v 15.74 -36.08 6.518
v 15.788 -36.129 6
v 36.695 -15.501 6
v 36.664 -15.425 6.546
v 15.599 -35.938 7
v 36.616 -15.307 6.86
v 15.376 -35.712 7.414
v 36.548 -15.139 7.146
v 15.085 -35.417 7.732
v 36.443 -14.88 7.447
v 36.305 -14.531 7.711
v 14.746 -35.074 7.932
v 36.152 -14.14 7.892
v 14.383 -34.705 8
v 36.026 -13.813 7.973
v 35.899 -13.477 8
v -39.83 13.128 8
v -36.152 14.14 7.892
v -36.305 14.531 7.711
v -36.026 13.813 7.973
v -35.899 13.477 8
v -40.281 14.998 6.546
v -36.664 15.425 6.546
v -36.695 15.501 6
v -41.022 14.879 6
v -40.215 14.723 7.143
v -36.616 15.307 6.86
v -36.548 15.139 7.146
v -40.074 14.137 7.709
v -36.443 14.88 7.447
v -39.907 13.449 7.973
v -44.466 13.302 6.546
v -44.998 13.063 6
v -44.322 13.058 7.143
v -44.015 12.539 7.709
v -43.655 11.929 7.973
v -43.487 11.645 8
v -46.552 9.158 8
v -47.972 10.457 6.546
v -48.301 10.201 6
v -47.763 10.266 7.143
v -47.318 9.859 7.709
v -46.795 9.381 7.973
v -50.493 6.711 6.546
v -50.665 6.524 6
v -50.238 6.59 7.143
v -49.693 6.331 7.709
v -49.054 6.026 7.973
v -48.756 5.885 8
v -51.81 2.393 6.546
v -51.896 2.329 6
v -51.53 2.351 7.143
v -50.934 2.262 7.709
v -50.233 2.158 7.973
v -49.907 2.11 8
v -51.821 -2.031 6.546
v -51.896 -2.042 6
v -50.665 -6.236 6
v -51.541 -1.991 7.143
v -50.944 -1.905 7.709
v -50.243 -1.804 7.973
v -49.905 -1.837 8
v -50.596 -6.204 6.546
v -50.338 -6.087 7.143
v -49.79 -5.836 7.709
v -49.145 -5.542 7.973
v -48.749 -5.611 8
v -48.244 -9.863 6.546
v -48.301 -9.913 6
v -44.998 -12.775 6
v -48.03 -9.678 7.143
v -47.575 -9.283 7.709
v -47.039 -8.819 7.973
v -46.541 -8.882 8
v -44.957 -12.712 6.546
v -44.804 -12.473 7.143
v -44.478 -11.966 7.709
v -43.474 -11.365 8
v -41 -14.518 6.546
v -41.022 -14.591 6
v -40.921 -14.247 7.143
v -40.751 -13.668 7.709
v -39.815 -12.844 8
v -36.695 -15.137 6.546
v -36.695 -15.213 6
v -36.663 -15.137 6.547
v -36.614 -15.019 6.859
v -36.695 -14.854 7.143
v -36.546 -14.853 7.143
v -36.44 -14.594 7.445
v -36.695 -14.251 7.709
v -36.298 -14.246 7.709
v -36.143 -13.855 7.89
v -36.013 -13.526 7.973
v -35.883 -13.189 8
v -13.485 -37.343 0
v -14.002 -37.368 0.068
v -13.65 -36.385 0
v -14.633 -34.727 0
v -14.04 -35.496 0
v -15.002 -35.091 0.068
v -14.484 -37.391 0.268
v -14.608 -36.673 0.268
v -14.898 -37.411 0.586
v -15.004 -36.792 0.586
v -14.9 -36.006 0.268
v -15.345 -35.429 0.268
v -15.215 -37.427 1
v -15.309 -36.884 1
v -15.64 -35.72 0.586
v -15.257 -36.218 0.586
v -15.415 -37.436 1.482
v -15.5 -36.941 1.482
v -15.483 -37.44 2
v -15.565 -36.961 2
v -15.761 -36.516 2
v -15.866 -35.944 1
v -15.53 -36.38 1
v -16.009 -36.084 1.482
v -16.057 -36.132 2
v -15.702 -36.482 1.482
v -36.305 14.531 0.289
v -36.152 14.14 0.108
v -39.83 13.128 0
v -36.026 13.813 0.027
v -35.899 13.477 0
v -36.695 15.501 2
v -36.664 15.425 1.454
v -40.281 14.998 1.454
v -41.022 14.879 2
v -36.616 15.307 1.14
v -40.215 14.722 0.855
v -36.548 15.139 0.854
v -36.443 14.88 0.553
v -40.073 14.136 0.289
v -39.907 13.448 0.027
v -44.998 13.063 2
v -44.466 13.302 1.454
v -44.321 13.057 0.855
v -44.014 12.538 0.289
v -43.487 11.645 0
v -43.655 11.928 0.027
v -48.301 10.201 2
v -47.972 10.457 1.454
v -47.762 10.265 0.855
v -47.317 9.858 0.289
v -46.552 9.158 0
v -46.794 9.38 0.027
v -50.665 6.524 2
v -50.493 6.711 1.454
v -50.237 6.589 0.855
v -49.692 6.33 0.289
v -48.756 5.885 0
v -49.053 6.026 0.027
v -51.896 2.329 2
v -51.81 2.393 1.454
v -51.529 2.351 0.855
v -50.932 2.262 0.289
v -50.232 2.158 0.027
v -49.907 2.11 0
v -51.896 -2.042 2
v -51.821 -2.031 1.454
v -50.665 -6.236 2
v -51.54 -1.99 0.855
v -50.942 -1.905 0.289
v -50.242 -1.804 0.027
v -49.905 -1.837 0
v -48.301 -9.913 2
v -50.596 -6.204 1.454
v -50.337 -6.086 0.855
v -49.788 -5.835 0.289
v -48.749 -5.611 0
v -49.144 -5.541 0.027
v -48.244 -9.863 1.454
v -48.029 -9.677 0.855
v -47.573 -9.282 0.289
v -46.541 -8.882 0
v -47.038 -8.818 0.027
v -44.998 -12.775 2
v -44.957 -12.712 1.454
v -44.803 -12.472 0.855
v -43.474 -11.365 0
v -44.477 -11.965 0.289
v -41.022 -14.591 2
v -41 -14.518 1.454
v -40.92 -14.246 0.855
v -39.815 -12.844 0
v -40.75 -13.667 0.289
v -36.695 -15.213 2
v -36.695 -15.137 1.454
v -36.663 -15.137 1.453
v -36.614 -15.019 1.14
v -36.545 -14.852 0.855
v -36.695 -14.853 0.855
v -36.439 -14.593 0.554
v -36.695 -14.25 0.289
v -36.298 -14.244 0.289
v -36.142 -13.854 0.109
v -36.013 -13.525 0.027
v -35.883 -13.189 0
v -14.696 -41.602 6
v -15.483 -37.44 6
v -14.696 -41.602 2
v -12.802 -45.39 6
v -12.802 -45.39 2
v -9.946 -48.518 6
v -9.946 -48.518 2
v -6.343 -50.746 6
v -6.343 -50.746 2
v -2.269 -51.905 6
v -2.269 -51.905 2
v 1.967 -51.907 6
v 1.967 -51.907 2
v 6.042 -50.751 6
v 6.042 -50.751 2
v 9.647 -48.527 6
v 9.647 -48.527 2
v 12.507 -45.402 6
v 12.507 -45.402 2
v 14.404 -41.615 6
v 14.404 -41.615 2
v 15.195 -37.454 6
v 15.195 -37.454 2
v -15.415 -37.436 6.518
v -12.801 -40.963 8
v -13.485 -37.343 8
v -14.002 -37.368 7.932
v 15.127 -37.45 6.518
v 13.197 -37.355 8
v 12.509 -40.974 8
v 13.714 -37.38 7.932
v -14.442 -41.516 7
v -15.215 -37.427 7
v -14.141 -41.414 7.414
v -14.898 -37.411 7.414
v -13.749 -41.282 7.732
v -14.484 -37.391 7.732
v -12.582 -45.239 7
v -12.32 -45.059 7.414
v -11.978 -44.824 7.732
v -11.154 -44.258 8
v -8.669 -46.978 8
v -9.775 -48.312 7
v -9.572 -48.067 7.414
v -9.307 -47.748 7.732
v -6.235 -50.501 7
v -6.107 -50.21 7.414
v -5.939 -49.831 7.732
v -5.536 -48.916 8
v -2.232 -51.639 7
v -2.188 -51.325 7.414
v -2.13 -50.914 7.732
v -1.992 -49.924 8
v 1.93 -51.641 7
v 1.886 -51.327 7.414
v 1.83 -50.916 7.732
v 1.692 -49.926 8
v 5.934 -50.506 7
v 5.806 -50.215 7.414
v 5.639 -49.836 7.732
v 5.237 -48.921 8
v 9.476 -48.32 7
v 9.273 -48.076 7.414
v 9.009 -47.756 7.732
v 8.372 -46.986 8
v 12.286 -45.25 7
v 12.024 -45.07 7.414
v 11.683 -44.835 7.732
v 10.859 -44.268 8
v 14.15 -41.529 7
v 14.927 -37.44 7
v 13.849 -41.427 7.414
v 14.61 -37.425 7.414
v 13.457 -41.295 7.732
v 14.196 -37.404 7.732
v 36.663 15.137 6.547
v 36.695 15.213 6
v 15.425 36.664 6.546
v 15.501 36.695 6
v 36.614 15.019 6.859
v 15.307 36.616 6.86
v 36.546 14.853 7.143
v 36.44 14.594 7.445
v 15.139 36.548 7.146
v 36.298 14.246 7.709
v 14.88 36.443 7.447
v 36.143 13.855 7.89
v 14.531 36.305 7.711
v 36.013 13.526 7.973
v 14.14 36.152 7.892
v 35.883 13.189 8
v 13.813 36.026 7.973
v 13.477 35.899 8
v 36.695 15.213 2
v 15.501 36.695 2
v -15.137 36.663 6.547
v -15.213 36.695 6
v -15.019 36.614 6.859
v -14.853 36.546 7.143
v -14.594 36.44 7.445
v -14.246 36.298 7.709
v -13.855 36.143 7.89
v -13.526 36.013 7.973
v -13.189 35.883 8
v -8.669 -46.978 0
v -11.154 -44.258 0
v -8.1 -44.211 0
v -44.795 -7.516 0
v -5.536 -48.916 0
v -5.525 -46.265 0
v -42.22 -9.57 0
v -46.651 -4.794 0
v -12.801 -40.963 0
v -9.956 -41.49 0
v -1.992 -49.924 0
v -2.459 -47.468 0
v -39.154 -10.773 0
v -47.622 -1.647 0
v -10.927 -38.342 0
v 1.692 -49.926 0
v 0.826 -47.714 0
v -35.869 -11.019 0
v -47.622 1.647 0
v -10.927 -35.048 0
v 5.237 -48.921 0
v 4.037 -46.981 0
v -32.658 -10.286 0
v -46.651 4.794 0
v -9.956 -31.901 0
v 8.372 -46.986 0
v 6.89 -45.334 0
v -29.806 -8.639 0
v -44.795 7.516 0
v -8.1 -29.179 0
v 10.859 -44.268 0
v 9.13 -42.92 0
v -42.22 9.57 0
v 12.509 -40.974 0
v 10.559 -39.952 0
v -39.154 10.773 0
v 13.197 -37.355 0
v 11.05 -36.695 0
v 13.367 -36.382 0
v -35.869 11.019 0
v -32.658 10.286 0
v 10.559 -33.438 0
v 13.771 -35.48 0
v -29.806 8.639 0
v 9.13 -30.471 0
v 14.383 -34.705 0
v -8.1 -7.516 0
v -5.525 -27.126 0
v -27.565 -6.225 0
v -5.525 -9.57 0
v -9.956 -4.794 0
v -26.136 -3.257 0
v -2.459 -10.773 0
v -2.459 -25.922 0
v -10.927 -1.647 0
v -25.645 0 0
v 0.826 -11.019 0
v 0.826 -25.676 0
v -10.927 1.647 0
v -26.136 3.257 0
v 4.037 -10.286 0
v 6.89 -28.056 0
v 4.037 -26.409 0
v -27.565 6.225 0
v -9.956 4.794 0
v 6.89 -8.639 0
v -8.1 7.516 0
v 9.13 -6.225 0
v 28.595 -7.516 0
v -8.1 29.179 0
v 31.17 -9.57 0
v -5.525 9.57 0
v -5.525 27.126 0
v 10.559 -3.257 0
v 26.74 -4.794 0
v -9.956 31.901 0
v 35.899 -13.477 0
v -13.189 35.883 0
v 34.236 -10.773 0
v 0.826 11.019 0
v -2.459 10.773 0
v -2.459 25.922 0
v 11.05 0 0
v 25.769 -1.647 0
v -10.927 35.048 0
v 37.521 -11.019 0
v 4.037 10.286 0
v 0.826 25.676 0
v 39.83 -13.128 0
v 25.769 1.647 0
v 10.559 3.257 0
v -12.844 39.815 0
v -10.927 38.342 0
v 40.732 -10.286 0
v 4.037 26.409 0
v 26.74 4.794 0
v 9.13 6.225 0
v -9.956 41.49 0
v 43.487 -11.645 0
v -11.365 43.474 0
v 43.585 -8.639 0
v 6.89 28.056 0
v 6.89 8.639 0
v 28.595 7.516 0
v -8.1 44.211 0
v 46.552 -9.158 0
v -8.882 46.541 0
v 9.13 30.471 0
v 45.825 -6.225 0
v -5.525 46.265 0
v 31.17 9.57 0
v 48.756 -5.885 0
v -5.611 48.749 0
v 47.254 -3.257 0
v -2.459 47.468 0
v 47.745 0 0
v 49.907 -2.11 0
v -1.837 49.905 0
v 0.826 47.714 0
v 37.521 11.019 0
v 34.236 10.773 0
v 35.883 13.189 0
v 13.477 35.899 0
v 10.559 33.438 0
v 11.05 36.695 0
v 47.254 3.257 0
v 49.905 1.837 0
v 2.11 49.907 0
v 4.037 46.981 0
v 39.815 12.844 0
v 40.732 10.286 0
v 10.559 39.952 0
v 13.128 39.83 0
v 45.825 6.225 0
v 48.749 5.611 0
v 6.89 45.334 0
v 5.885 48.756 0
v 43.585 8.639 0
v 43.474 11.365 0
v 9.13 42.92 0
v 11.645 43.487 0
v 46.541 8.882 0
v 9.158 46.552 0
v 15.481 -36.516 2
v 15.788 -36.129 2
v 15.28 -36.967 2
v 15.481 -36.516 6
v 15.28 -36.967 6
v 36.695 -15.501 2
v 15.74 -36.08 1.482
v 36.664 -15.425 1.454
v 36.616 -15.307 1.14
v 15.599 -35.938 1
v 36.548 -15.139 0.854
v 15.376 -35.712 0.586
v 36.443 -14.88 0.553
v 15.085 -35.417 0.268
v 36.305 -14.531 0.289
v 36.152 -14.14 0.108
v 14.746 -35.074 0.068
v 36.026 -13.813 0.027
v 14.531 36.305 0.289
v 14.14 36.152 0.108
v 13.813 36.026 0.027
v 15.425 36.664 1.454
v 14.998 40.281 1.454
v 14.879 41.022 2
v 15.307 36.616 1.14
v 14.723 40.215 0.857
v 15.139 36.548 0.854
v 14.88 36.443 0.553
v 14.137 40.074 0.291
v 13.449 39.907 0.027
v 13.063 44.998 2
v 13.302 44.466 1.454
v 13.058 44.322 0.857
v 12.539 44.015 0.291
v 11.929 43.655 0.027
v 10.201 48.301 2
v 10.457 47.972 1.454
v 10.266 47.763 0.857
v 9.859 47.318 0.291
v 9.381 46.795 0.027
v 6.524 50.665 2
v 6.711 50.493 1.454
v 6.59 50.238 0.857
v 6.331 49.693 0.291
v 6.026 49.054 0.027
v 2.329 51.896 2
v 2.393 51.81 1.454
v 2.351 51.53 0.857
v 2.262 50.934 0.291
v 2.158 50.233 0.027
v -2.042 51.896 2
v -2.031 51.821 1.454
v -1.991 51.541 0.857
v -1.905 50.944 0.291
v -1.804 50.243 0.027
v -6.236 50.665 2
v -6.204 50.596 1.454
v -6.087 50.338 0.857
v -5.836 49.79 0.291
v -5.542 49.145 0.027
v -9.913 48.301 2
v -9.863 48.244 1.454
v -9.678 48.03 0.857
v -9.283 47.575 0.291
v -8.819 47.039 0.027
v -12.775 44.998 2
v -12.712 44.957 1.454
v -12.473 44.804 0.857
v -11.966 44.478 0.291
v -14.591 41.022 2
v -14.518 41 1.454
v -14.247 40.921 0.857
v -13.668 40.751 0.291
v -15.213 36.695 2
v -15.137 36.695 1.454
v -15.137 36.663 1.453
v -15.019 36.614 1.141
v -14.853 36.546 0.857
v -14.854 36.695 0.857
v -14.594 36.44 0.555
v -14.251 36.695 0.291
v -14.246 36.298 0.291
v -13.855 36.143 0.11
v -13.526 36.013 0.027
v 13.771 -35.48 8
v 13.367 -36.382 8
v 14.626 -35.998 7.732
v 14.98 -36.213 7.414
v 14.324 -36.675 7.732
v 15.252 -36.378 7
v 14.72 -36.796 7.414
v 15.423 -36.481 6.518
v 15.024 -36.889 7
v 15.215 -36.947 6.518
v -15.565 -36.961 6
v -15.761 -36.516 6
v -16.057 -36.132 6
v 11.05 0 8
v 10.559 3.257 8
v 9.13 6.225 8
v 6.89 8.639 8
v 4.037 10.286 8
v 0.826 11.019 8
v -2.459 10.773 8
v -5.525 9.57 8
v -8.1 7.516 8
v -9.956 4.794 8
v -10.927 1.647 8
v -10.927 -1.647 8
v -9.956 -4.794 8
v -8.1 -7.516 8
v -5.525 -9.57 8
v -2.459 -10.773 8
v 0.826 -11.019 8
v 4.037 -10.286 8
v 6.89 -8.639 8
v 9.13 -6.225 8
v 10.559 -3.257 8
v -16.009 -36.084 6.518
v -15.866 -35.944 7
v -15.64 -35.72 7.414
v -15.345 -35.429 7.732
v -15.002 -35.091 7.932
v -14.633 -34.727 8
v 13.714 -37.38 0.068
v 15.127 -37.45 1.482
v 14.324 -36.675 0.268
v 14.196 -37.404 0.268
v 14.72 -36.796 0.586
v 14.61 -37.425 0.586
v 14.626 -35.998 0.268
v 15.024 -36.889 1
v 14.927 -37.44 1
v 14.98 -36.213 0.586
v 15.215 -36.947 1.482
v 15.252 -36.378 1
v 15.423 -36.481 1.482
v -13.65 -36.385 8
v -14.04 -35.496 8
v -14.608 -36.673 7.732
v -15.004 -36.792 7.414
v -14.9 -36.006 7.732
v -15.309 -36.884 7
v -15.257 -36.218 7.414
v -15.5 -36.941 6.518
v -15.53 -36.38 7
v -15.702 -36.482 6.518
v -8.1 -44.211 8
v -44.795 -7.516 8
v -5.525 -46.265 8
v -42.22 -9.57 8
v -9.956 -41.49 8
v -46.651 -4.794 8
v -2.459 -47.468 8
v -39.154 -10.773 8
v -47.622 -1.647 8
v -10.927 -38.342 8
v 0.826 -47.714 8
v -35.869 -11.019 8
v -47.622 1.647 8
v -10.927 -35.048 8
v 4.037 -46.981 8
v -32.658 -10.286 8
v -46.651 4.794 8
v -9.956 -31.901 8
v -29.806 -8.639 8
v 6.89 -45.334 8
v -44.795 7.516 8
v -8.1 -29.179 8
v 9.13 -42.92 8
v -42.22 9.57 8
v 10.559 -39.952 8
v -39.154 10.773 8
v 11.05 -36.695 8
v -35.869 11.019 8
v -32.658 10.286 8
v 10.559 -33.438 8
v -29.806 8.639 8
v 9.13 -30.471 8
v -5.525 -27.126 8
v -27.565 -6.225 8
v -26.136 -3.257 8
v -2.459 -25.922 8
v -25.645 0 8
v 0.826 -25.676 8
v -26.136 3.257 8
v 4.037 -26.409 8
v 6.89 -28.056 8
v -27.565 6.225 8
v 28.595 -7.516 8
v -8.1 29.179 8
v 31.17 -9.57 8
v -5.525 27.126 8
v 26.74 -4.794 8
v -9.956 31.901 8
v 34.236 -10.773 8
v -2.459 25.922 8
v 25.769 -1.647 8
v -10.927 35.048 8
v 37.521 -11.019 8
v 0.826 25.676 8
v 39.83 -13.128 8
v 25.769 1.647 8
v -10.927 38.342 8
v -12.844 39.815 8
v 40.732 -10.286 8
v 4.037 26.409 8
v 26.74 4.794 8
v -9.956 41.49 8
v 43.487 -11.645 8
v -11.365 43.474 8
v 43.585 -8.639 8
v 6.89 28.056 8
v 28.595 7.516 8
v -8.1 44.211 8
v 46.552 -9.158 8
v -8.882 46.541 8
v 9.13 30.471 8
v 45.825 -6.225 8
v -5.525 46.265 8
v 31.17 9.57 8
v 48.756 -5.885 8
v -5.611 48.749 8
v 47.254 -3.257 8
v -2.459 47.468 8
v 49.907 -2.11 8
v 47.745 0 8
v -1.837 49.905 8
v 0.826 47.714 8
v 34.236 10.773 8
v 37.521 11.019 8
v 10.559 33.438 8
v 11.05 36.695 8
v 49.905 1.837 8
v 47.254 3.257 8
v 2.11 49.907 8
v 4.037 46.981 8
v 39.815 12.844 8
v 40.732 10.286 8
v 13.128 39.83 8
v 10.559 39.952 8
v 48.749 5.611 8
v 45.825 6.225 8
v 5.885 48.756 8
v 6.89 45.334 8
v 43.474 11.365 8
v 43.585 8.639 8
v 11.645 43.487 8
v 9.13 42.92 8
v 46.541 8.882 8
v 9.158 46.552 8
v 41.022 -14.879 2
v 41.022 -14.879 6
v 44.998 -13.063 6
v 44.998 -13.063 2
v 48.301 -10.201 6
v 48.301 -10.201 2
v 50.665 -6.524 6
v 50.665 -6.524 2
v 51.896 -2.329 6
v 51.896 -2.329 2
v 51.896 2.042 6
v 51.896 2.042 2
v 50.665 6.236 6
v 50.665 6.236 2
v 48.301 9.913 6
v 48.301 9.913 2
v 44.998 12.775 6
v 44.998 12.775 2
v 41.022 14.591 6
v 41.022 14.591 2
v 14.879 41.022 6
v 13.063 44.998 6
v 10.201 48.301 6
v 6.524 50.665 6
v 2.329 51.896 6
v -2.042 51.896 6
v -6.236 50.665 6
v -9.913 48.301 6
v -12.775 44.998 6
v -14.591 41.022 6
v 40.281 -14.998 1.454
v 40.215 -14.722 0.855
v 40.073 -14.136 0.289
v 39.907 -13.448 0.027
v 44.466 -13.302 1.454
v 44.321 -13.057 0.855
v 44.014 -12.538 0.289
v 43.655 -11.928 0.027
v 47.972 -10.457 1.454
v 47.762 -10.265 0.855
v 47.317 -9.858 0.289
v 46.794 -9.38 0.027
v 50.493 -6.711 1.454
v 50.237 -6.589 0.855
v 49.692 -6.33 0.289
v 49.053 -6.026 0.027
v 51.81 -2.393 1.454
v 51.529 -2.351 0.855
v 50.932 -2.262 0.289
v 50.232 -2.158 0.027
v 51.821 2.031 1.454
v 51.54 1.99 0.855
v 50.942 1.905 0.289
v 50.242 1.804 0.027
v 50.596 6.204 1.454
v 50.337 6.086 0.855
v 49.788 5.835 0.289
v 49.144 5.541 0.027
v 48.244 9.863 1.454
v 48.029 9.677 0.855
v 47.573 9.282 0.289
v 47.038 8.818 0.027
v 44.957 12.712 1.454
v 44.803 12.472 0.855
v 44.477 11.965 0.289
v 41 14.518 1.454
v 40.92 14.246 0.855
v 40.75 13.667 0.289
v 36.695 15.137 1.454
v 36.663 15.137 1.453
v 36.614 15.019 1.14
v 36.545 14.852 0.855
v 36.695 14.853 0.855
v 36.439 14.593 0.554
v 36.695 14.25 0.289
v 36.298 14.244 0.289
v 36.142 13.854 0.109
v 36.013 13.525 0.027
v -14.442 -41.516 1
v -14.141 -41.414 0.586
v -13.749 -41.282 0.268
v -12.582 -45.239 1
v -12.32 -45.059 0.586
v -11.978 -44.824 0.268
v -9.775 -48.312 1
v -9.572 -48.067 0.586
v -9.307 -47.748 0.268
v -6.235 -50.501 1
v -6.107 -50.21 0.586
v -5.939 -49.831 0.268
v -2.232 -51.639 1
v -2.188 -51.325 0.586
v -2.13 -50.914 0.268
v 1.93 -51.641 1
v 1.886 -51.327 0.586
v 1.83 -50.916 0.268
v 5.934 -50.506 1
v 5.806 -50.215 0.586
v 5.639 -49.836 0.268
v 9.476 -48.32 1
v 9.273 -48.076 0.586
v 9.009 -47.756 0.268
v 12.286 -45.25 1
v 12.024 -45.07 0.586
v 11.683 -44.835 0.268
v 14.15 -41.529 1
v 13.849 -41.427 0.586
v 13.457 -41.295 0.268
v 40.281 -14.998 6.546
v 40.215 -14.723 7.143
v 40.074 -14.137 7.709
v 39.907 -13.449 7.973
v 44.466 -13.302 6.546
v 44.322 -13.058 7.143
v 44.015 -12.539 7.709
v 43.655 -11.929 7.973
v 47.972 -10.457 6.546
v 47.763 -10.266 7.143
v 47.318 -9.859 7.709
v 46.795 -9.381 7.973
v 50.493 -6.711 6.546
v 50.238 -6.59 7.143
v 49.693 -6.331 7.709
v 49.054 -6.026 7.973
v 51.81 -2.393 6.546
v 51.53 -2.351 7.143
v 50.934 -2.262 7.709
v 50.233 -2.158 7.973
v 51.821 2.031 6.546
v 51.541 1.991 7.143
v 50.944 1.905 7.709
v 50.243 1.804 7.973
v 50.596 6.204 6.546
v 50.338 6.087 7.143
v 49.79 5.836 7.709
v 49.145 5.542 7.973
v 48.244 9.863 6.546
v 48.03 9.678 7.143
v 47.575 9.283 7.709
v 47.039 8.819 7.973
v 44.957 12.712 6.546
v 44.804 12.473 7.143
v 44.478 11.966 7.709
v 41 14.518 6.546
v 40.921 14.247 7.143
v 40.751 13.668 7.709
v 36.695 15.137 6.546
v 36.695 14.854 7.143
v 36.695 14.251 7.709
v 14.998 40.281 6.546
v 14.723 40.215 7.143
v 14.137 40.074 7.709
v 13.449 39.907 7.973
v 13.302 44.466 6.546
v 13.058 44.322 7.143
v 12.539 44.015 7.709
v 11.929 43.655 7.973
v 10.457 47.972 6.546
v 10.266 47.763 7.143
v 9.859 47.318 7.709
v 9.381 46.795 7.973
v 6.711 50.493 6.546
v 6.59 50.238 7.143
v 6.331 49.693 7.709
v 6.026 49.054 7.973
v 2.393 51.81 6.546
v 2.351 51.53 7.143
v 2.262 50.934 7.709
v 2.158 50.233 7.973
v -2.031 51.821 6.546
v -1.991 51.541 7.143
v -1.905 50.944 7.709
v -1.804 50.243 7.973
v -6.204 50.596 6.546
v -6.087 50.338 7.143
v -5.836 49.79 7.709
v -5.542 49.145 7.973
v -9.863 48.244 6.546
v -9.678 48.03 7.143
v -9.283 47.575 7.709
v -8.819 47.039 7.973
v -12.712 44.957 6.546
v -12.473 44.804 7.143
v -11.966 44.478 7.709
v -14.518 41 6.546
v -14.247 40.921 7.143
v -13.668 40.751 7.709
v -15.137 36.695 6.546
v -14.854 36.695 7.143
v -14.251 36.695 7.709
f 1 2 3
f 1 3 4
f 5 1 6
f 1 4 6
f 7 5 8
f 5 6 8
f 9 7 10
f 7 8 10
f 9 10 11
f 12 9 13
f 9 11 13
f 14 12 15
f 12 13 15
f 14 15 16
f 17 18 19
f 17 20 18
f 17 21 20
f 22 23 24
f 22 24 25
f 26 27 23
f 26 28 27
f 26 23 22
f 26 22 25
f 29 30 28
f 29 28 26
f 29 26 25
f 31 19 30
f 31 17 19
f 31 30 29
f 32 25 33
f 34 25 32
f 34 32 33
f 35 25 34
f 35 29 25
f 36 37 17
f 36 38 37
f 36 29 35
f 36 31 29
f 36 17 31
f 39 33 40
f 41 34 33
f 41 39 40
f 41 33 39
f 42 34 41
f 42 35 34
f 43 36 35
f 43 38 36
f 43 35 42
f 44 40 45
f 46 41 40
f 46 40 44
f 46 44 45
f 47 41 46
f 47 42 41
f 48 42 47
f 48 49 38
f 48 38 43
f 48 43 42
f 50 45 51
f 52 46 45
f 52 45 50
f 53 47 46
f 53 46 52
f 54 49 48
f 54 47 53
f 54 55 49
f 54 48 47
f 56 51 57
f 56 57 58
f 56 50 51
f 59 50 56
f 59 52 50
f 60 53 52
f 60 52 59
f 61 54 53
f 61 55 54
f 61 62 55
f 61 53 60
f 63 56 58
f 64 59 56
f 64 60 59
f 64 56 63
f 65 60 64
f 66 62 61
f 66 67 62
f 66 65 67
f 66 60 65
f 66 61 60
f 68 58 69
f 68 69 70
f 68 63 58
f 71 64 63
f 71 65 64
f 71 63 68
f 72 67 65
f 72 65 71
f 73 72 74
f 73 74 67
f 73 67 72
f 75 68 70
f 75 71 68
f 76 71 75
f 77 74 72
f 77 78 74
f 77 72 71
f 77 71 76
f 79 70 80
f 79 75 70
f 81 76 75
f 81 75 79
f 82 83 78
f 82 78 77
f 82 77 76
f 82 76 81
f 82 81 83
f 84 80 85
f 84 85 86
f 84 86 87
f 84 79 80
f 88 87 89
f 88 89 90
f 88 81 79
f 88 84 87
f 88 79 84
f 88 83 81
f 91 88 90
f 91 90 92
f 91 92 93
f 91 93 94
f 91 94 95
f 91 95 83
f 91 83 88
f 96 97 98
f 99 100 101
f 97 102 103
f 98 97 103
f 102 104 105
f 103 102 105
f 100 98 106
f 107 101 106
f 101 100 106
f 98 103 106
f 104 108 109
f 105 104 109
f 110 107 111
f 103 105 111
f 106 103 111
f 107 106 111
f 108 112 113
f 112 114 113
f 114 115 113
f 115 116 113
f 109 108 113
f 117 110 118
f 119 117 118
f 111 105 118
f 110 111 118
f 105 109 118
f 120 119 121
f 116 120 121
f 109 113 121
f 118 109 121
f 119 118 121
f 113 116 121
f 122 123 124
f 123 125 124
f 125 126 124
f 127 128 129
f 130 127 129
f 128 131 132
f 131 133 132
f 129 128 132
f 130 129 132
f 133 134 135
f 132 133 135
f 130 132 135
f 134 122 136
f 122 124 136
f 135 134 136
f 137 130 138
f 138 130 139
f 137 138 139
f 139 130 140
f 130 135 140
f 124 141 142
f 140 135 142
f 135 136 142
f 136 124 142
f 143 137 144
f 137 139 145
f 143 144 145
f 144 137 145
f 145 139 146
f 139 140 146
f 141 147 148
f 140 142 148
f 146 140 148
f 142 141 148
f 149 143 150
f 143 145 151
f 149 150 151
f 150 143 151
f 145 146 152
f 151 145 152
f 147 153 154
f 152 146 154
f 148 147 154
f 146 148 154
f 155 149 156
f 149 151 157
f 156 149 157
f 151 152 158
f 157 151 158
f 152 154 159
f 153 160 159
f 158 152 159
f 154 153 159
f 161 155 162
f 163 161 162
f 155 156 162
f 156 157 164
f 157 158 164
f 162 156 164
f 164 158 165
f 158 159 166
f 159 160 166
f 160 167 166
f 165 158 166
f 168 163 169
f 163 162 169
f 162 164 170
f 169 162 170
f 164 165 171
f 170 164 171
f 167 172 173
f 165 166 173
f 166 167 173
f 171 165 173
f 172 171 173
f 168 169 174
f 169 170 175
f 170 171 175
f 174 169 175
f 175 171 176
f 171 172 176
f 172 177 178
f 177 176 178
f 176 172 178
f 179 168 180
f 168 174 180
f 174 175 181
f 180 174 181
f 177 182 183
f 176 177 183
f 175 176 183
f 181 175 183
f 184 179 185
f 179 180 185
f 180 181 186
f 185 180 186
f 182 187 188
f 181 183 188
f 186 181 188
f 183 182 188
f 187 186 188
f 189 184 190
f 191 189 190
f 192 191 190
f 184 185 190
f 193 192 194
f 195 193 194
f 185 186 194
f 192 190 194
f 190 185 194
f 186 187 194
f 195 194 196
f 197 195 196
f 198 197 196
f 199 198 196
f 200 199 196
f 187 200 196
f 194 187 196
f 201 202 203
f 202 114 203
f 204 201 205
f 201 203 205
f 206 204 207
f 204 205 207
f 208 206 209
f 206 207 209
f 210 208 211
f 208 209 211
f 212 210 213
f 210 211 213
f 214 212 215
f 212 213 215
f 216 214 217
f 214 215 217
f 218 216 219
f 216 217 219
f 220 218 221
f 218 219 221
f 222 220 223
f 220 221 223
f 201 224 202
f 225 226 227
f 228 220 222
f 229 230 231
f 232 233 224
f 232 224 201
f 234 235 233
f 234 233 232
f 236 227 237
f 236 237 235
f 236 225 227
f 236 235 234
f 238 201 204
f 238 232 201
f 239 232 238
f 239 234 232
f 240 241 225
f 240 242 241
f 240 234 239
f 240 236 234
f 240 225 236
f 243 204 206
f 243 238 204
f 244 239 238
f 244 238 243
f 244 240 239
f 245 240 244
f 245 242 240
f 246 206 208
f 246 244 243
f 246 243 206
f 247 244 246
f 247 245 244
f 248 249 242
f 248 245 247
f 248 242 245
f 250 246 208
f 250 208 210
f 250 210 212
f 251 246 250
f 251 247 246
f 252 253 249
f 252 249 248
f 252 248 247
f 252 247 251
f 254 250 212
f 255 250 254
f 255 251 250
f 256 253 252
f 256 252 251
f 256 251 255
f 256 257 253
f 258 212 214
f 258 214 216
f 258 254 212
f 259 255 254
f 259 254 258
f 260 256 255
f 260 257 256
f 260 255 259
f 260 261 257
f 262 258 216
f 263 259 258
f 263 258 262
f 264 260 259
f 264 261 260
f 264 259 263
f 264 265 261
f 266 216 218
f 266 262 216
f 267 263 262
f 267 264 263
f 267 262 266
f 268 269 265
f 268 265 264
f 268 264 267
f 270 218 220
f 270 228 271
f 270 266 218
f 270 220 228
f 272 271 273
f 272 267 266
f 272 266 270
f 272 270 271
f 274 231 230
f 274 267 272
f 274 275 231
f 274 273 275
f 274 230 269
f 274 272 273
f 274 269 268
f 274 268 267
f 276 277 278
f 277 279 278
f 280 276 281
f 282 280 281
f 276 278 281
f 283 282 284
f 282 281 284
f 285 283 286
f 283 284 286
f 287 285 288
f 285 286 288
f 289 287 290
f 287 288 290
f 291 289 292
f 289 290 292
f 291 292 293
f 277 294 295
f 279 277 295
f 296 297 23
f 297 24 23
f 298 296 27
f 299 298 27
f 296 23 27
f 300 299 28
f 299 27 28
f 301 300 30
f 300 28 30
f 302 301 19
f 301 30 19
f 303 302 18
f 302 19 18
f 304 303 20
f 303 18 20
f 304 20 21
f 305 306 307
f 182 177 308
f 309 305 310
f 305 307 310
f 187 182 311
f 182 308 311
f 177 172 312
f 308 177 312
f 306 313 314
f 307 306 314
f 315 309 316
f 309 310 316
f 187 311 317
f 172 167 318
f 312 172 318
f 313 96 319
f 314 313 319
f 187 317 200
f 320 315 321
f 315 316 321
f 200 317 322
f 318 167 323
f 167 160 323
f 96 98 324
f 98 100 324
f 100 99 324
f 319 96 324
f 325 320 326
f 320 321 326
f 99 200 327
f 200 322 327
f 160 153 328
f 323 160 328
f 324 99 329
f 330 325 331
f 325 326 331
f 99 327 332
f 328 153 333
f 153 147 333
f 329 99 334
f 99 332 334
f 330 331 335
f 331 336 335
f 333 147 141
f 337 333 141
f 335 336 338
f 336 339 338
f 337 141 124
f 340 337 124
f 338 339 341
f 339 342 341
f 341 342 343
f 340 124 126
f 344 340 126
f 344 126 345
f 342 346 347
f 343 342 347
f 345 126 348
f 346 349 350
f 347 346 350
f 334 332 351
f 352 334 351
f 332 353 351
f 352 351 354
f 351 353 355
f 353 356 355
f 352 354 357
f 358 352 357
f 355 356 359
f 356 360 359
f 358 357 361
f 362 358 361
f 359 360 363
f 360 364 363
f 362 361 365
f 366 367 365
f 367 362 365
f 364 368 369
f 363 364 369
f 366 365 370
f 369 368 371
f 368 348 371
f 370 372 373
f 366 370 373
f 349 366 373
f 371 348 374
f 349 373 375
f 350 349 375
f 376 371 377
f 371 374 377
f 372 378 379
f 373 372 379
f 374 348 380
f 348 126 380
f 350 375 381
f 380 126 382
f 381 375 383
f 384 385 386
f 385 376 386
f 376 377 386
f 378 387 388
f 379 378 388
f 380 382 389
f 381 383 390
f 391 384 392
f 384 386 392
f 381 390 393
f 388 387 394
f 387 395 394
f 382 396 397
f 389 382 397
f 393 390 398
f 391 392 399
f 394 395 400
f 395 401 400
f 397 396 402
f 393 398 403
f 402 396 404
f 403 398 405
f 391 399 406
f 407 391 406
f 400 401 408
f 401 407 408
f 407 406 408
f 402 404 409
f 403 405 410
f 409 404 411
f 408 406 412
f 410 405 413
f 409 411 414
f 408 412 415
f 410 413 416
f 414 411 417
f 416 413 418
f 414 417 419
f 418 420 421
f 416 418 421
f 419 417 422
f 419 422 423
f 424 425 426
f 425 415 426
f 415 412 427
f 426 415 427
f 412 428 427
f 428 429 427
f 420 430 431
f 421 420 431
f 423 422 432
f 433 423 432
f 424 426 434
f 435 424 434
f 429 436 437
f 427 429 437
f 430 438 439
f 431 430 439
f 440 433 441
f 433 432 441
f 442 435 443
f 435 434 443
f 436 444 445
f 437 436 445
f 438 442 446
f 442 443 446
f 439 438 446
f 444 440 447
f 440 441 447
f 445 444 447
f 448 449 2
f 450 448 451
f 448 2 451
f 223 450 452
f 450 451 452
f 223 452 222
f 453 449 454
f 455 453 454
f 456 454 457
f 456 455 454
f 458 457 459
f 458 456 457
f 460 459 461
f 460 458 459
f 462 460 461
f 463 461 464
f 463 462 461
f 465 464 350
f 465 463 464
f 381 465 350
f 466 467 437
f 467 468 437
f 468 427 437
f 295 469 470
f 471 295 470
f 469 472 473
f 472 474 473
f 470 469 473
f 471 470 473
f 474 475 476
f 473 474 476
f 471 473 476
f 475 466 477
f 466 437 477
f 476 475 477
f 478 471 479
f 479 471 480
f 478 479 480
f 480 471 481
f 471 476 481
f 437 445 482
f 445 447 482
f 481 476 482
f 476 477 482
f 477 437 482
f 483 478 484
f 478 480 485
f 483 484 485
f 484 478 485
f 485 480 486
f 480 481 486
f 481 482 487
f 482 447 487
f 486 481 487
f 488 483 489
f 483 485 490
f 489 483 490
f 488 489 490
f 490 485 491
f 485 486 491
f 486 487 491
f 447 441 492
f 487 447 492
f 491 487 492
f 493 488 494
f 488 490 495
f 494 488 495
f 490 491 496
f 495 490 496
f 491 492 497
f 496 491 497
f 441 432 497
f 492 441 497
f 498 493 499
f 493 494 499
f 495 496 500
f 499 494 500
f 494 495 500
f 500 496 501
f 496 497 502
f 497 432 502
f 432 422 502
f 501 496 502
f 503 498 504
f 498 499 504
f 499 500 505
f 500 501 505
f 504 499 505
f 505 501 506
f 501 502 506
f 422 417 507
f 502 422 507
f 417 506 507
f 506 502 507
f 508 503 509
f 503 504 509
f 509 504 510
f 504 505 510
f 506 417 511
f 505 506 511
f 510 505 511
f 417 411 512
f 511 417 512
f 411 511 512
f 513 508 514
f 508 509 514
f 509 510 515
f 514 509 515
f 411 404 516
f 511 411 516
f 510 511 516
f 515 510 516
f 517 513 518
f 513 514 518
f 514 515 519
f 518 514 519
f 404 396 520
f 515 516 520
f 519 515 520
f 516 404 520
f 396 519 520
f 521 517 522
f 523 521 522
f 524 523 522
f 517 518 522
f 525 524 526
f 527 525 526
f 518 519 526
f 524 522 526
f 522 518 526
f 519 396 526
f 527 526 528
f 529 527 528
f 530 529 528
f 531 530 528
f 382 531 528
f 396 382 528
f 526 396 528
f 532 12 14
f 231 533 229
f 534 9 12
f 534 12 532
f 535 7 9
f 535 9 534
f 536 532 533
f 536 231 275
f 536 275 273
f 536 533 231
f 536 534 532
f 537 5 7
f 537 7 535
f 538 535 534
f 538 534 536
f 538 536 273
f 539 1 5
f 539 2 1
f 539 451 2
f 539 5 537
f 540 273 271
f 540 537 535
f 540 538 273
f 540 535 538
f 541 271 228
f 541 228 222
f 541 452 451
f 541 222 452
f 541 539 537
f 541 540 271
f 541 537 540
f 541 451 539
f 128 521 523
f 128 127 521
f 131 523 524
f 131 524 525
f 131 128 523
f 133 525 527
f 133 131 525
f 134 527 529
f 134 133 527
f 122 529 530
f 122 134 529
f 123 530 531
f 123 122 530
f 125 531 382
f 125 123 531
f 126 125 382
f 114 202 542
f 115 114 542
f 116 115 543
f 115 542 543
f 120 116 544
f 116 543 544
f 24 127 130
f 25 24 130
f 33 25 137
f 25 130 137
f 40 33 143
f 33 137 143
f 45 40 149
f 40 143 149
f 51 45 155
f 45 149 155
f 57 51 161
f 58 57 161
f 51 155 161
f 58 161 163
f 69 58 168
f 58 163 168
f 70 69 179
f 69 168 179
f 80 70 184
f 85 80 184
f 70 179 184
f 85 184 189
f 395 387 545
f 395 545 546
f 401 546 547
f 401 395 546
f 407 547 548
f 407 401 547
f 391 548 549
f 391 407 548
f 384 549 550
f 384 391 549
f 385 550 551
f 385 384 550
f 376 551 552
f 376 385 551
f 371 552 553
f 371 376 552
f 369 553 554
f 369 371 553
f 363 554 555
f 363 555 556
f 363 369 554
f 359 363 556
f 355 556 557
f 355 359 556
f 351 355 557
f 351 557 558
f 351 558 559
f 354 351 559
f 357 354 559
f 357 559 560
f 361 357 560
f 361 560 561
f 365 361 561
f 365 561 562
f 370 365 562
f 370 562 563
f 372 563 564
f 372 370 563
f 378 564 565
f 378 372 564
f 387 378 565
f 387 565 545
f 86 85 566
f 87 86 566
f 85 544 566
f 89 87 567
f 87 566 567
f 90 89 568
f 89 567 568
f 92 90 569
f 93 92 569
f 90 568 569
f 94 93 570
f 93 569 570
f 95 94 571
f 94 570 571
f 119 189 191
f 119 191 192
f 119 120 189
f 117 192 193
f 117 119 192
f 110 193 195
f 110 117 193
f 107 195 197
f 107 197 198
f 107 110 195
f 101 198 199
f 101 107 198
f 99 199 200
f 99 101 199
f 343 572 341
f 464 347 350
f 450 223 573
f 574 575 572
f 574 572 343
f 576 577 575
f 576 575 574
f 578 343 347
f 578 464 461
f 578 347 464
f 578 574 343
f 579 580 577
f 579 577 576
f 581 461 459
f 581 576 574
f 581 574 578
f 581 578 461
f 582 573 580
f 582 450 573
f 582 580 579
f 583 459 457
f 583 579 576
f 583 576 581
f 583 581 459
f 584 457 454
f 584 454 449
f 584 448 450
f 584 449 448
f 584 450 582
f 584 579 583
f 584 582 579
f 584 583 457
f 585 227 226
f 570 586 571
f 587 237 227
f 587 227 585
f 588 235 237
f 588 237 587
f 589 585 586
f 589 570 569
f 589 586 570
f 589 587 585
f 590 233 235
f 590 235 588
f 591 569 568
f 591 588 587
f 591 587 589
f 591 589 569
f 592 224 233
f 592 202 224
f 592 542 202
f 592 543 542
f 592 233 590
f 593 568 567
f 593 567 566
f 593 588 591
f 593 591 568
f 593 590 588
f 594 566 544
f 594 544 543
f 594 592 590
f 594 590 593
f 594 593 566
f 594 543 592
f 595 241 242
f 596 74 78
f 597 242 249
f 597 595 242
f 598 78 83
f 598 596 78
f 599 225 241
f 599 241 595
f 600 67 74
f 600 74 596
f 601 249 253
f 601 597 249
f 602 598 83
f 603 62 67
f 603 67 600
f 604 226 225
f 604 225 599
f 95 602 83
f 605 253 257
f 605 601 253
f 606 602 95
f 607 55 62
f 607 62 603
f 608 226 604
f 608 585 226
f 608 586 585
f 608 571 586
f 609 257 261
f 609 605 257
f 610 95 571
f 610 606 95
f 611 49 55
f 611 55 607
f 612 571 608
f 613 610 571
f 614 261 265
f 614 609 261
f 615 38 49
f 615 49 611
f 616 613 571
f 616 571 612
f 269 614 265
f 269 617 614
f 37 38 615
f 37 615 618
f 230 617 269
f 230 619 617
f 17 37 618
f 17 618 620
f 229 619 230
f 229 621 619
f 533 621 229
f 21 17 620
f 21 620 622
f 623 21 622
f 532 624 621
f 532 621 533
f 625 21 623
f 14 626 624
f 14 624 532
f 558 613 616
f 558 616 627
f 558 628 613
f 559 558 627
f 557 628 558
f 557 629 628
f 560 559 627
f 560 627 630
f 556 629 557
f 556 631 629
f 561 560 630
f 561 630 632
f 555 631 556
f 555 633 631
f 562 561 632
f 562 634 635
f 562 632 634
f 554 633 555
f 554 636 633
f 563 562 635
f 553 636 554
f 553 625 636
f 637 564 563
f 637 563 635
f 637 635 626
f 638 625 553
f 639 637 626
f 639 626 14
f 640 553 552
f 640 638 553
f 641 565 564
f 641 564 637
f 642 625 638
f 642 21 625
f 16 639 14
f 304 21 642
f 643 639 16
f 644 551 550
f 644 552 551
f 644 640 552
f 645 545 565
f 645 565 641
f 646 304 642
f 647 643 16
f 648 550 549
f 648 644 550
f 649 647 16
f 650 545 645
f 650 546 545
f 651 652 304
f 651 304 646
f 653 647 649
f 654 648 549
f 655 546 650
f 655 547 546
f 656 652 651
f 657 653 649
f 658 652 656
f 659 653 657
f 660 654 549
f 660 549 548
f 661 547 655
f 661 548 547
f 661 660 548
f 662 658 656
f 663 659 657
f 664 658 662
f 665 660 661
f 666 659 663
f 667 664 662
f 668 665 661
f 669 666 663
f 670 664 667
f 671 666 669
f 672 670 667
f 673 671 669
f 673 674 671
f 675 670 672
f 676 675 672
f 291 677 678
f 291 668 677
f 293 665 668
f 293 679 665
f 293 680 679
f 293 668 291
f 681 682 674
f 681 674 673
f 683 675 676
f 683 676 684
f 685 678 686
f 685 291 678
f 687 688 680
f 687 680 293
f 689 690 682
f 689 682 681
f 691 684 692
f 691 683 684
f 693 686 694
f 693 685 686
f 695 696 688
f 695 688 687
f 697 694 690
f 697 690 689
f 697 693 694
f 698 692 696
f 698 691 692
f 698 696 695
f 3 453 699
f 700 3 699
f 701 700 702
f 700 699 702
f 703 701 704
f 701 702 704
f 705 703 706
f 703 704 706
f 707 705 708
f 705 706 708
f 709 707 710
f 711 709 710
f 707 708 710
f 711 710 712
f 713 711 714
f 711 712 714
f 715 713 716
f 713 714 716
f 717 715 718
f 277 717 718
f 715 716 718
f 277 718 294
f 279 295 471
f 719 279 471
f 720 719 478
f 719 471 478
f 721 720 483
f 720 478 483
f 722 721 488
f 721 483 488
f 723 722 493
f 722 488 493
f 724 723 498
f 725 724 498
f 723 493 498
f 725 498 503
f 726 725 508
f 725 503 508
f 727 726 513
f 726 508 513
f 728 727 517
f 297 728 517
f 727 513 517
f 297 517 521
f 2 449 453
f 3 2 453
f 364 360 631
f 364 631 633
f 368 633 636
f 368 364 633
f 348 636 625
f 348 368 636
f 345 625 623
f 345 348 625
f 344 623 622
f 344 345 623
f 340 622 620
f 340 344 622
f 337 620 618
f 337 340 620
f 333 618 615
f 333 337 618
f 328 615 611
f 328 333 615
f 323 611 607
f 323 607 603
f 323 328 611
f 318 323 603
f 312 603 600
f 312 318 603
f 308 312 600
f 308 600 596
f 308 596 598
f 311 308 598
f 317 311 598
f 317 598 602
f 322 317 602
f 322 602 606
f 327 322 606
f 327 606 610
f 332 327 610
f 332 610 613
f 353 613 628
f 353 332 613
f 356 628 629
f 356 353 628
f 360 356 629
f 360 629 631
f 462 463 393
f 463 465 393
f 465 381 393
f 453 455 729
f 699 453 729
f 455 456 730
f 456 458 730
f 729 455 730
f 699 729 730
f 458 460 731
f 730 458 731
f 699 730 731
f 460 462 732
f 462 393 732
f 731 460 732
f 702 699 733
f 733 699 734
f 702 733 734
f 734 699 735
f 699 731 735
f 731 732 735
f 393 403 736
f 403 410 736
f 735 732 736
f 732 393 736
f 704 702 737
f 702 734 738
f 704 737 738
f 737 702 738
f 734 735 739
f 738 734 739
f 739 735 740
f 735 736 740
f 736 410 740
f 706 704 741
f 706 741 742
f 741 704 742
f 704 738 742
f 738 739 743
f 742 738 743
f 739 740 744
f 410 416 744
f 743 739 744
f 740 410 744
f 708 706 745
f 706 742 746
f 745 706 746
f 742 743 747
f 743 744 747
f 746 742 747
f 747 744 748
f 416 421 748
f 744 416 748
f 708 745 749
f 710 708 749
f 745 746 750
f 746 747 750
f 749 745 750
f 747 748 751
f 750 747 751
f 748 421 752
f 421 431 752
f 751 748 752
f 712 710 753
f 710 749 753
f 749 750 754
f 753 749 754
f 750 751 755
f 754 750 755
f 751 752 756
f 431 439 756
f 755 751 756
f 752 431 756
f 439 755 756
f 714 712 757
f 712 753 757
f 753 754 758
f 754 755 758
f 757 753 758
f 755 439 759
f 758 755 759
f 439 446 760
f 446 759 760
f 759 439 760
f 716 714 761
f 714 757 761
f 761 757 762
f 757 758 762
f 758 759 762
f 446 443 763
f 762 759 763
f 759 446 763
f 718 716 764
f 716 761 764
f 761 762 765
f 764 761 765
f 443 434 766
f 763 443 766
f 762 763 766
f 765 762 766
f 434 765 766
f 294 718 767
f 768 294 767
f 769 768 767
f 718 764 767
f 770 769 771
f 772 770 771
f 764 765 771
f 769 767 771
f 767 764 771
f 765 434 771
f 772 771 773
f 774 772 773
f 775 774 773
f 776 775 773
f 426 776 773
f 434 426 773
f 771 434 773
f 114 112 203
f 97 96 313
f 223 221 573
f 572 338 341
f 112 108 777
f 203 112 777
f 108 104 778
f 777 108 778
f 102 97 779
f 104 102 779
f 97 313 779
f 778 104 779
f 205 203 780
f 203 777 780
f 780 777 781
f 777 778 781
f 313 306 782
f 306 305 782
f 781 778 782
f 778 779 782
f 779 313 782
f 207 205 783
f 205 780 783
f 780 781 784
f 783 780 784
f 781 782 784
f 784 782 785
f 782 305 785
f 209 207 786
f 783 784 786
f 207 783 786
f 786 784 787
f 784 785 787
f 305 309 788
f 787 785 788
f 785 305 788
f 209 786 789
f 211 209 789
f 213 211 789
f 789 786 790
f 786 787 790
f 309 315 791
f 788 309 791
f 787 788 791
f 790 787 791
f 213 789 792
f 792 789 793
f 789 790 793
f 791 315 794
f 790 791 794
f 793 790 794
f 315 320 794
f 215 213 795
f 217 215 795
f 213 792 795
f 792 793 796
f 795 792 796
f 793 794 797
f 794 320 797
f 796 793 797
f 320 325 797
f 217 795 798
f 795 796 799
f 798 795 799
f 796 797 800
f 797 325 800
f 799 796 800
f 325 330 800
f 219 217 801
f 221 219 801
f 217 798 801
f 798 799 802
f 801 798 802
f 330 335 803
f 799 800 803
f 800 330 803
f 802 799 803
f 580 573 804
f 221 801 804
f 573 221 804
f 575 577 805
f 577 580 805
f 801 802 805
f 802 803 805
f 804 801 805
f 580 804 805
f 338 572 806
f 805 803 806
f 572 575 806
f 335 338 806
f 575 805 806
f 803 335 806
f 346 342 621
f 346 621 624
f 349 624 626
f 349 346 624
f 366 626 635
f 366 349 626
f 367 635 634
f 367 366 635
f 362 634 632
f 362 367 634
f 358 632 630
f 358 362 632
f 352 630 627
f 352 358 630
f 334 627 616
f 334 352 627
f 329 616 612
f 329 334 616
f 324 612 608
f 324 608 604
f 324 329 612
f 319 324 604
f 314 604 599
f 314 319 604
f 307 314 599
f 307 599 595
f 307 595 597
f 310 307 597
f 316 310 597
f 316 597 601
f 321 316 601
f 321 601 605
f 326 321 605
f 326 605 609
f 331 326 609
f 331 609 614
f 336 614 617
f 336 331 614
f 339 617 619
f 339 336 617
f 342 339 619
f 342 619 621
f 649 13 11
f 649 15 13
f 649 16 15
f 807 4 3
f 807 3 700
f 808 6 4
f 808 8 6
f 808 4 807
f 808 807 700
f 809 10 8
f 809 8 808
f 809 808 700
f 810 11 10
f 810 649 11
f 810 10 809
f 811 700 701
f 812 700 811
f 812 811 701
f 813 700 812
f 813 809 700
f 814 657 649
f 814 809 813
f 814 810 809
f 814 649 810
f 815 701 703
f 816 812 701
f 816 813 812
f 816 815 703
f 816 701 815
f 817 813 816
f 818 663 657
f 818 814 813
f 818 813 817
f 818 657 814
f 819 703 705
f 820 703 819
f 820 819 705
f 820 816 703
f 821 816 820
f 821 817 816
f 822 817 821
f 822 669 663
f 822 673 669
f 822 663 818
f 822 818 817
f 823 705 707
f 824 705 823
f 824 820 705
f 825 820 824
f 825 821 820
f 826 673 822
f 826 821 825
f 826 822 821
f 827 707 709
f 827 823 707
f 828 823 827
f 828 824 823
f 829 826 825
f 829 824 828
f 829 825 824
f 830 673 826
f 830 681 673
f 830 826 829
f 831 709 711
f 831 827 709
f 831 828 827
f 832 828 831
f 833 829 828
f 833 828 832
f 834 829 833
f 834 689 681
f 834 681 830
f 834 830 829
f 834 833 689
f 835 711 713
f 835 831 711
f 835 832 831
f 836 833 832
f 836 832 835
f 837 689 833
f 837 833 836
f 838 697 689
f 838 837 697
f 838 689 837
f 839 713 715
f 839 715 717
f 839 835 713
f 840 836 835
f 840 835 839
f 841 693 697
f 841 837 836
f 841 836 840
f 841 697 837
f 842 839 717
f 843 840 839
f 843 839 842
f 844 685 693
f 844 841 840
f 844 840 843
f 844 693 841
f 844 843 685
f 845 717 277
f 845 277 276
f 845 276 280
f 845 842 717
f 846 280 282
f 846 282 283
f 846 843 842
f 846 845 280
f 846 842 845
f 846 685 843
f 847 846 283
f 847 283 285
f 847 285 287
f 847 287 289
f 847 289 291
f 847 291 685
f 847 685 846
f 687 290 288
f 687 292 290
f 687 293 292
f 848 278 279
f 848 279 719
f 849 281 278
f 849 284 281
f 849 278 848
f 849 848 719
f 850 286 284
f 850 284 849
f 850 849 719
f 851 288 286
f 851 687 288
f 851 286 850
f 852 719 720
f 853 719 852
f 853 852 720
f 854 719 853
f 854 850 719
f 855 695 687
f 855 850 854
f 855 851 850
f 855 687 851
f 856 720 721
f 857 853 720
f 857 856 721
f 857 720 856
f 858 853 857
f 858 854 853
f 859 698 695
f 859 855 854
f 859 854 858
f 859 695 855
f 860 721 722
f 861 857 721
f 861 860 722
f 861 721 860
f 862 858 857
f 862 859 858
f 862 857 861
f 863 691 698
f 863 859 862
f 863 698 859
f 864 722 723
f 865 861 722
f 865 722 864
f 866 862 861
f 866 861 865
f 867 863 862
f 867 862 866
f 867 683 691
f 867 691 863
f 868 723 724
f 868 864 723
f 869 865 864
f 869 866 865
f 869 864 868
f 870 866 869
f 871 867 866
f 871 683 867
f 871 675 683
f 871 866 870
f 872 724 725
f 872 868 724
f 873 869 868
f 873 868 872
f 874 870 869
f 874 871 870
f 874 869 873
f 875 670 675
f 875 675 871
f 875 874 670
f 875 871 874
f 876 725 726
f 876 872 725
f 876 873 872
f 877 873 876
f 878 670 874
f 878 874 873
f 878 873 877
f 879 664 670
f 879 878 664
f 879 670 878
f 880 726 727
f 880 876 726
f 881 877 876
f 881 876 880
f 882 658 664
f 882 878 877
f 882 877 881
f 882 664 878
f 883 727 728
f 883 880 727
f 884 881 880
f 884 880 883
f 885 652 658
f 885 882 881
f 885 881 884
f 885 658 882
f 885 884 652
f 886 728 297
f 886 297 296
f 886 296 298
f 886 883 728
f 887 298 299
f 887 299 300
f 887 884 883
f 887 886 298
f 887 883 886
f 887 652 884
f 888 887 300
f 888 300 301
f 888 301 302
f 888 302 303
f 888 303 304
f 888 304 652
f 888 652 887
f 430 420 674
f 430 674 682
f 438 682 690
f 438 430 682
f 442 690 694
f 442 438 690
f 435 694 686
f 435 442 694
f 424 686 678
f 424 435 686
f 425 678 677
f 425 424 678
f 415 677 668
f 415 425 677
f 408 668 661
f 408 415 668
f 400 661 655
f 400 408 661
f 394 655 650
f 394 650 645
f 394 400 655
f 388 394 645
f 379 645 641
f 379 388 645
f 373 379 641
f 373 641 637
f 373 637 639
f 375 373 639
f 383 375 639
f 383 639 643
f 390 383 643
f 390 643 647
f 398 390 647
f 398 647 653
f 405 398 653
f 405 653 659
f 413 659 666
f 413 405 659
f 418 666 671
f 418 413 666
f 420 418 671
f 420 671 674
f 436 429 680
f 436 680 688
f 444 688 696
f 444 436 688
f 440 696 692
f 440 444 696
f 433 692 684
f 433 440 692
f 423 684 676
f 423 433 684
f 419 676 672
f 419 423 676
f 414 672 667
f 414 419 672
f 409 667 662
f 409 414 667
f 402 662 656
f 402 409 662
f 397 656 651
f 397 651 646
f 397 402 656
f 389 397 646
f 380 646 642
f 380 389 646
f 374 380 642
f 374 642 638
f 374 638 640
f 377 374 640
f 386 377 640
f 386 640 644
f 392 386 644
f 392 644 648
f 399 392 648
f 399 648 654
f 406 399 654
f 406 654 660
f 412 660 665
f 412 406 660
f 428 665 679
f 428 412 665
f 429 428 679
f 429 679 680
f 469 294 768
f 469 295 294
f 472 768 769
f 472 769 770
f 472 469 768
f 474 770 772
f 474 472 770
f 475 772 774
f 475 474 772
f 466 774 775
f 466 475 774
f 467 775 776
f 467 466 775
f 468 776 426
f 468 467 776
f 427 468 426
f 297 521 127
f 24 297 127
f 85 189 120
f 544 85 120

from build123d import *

# Parameters (mm, degrees)
F0_R     = 11.05
F1_DEPTH = 8
F2_R     = 2


with BuildPart() as f1:
    # F0 (on Top) → F1 (new body)
    with BuildSketch(Plane.XY):
        with BuildLine():
            Line((36.6952344775, 15.2133565883), (15.5011650662, 36.6952344775))
            ThreePointArc((15.5011650662, 36.6952344775), (0.1439042389, 52.0524953048), (-15.2133565883, 36.6952344775))
            Line((-15.2133565883, 36.6952344775), (-36.6952344775, 15.5011650662))
            ThreePointArc((-36.6952344775, 15.5011650662), (-52.0524953048, 0.1439042389), (-36.6952344775, -15.2133565883))
            Line((-36.6952344775, -15.2133565883), (-15.5011650662, -36.6952344775))
            ThreePointArc((-15.5011650662, -36.6952344775), (-0.1439042389, -52.0524953048), (15.2133565883, -36.6952344775))
            Line((15.2133565883, -36.6952344775), (36.6952344775, -15.5011650662))
            ThreePointArc((36.6952344775, -15.5011650662), (52.0524953048, -0.1439042389), (36.6952344775, 15.2133565883))
        make_face()
        with Locations((0, -36.6952344775)):
            Circle(F0_R, mode=Mode.SUBTRACT)
        with Locations((-36.6952344775, 0)):
            Circle(F0_R, mode=Mode.SUBTRACT)
        Circle(F0_R, mode=Mode.SUBTRACT)
        with Locations((0, 36.6952344775)):
            Circle(F0_R, mode=Mode.SUBTRACT)
        with Locations((36.6952344775, 0)):
            Circle(F0_R, mode=Mode.SUBTRACT)
    extrude(amount=F1_DEPTH)

    # F2
    f2_edges = [f1.edges().sort_by_distance(p)[0] for p in [
        (-25.954296, 26.0982, 8),
        (0.143904, 52.052495, 8),
        (26.0982, 25.954296, 8),
        (52.052495, -0.143904, 8),
        (25.954296, -26.0982, 8),
        (-0.143904, -52.052495, 8),
        (-26.0982, -25.954296, 8),
        (-52.052495, 0.143904, 8),
        (-15.501165, -36.695234, 4),
        (15.213357, -36.695234, 4),
        (-0.143904, -52.052495, 0),
        (25.954296, -26.0982, 0),
        (52.052495, -0.143904, 0),
        (26.0982, 25.954296, 0),
        (0.143904, 52.052495, 0),
        (-25.954296, 26.0982, 0),
        (-52.052495, 0.143904, 0),
        (-26.0982, -25.954296, 0),
    ]]
    fillet(f2_edges, radius=F2_R)


solid = f1.part
